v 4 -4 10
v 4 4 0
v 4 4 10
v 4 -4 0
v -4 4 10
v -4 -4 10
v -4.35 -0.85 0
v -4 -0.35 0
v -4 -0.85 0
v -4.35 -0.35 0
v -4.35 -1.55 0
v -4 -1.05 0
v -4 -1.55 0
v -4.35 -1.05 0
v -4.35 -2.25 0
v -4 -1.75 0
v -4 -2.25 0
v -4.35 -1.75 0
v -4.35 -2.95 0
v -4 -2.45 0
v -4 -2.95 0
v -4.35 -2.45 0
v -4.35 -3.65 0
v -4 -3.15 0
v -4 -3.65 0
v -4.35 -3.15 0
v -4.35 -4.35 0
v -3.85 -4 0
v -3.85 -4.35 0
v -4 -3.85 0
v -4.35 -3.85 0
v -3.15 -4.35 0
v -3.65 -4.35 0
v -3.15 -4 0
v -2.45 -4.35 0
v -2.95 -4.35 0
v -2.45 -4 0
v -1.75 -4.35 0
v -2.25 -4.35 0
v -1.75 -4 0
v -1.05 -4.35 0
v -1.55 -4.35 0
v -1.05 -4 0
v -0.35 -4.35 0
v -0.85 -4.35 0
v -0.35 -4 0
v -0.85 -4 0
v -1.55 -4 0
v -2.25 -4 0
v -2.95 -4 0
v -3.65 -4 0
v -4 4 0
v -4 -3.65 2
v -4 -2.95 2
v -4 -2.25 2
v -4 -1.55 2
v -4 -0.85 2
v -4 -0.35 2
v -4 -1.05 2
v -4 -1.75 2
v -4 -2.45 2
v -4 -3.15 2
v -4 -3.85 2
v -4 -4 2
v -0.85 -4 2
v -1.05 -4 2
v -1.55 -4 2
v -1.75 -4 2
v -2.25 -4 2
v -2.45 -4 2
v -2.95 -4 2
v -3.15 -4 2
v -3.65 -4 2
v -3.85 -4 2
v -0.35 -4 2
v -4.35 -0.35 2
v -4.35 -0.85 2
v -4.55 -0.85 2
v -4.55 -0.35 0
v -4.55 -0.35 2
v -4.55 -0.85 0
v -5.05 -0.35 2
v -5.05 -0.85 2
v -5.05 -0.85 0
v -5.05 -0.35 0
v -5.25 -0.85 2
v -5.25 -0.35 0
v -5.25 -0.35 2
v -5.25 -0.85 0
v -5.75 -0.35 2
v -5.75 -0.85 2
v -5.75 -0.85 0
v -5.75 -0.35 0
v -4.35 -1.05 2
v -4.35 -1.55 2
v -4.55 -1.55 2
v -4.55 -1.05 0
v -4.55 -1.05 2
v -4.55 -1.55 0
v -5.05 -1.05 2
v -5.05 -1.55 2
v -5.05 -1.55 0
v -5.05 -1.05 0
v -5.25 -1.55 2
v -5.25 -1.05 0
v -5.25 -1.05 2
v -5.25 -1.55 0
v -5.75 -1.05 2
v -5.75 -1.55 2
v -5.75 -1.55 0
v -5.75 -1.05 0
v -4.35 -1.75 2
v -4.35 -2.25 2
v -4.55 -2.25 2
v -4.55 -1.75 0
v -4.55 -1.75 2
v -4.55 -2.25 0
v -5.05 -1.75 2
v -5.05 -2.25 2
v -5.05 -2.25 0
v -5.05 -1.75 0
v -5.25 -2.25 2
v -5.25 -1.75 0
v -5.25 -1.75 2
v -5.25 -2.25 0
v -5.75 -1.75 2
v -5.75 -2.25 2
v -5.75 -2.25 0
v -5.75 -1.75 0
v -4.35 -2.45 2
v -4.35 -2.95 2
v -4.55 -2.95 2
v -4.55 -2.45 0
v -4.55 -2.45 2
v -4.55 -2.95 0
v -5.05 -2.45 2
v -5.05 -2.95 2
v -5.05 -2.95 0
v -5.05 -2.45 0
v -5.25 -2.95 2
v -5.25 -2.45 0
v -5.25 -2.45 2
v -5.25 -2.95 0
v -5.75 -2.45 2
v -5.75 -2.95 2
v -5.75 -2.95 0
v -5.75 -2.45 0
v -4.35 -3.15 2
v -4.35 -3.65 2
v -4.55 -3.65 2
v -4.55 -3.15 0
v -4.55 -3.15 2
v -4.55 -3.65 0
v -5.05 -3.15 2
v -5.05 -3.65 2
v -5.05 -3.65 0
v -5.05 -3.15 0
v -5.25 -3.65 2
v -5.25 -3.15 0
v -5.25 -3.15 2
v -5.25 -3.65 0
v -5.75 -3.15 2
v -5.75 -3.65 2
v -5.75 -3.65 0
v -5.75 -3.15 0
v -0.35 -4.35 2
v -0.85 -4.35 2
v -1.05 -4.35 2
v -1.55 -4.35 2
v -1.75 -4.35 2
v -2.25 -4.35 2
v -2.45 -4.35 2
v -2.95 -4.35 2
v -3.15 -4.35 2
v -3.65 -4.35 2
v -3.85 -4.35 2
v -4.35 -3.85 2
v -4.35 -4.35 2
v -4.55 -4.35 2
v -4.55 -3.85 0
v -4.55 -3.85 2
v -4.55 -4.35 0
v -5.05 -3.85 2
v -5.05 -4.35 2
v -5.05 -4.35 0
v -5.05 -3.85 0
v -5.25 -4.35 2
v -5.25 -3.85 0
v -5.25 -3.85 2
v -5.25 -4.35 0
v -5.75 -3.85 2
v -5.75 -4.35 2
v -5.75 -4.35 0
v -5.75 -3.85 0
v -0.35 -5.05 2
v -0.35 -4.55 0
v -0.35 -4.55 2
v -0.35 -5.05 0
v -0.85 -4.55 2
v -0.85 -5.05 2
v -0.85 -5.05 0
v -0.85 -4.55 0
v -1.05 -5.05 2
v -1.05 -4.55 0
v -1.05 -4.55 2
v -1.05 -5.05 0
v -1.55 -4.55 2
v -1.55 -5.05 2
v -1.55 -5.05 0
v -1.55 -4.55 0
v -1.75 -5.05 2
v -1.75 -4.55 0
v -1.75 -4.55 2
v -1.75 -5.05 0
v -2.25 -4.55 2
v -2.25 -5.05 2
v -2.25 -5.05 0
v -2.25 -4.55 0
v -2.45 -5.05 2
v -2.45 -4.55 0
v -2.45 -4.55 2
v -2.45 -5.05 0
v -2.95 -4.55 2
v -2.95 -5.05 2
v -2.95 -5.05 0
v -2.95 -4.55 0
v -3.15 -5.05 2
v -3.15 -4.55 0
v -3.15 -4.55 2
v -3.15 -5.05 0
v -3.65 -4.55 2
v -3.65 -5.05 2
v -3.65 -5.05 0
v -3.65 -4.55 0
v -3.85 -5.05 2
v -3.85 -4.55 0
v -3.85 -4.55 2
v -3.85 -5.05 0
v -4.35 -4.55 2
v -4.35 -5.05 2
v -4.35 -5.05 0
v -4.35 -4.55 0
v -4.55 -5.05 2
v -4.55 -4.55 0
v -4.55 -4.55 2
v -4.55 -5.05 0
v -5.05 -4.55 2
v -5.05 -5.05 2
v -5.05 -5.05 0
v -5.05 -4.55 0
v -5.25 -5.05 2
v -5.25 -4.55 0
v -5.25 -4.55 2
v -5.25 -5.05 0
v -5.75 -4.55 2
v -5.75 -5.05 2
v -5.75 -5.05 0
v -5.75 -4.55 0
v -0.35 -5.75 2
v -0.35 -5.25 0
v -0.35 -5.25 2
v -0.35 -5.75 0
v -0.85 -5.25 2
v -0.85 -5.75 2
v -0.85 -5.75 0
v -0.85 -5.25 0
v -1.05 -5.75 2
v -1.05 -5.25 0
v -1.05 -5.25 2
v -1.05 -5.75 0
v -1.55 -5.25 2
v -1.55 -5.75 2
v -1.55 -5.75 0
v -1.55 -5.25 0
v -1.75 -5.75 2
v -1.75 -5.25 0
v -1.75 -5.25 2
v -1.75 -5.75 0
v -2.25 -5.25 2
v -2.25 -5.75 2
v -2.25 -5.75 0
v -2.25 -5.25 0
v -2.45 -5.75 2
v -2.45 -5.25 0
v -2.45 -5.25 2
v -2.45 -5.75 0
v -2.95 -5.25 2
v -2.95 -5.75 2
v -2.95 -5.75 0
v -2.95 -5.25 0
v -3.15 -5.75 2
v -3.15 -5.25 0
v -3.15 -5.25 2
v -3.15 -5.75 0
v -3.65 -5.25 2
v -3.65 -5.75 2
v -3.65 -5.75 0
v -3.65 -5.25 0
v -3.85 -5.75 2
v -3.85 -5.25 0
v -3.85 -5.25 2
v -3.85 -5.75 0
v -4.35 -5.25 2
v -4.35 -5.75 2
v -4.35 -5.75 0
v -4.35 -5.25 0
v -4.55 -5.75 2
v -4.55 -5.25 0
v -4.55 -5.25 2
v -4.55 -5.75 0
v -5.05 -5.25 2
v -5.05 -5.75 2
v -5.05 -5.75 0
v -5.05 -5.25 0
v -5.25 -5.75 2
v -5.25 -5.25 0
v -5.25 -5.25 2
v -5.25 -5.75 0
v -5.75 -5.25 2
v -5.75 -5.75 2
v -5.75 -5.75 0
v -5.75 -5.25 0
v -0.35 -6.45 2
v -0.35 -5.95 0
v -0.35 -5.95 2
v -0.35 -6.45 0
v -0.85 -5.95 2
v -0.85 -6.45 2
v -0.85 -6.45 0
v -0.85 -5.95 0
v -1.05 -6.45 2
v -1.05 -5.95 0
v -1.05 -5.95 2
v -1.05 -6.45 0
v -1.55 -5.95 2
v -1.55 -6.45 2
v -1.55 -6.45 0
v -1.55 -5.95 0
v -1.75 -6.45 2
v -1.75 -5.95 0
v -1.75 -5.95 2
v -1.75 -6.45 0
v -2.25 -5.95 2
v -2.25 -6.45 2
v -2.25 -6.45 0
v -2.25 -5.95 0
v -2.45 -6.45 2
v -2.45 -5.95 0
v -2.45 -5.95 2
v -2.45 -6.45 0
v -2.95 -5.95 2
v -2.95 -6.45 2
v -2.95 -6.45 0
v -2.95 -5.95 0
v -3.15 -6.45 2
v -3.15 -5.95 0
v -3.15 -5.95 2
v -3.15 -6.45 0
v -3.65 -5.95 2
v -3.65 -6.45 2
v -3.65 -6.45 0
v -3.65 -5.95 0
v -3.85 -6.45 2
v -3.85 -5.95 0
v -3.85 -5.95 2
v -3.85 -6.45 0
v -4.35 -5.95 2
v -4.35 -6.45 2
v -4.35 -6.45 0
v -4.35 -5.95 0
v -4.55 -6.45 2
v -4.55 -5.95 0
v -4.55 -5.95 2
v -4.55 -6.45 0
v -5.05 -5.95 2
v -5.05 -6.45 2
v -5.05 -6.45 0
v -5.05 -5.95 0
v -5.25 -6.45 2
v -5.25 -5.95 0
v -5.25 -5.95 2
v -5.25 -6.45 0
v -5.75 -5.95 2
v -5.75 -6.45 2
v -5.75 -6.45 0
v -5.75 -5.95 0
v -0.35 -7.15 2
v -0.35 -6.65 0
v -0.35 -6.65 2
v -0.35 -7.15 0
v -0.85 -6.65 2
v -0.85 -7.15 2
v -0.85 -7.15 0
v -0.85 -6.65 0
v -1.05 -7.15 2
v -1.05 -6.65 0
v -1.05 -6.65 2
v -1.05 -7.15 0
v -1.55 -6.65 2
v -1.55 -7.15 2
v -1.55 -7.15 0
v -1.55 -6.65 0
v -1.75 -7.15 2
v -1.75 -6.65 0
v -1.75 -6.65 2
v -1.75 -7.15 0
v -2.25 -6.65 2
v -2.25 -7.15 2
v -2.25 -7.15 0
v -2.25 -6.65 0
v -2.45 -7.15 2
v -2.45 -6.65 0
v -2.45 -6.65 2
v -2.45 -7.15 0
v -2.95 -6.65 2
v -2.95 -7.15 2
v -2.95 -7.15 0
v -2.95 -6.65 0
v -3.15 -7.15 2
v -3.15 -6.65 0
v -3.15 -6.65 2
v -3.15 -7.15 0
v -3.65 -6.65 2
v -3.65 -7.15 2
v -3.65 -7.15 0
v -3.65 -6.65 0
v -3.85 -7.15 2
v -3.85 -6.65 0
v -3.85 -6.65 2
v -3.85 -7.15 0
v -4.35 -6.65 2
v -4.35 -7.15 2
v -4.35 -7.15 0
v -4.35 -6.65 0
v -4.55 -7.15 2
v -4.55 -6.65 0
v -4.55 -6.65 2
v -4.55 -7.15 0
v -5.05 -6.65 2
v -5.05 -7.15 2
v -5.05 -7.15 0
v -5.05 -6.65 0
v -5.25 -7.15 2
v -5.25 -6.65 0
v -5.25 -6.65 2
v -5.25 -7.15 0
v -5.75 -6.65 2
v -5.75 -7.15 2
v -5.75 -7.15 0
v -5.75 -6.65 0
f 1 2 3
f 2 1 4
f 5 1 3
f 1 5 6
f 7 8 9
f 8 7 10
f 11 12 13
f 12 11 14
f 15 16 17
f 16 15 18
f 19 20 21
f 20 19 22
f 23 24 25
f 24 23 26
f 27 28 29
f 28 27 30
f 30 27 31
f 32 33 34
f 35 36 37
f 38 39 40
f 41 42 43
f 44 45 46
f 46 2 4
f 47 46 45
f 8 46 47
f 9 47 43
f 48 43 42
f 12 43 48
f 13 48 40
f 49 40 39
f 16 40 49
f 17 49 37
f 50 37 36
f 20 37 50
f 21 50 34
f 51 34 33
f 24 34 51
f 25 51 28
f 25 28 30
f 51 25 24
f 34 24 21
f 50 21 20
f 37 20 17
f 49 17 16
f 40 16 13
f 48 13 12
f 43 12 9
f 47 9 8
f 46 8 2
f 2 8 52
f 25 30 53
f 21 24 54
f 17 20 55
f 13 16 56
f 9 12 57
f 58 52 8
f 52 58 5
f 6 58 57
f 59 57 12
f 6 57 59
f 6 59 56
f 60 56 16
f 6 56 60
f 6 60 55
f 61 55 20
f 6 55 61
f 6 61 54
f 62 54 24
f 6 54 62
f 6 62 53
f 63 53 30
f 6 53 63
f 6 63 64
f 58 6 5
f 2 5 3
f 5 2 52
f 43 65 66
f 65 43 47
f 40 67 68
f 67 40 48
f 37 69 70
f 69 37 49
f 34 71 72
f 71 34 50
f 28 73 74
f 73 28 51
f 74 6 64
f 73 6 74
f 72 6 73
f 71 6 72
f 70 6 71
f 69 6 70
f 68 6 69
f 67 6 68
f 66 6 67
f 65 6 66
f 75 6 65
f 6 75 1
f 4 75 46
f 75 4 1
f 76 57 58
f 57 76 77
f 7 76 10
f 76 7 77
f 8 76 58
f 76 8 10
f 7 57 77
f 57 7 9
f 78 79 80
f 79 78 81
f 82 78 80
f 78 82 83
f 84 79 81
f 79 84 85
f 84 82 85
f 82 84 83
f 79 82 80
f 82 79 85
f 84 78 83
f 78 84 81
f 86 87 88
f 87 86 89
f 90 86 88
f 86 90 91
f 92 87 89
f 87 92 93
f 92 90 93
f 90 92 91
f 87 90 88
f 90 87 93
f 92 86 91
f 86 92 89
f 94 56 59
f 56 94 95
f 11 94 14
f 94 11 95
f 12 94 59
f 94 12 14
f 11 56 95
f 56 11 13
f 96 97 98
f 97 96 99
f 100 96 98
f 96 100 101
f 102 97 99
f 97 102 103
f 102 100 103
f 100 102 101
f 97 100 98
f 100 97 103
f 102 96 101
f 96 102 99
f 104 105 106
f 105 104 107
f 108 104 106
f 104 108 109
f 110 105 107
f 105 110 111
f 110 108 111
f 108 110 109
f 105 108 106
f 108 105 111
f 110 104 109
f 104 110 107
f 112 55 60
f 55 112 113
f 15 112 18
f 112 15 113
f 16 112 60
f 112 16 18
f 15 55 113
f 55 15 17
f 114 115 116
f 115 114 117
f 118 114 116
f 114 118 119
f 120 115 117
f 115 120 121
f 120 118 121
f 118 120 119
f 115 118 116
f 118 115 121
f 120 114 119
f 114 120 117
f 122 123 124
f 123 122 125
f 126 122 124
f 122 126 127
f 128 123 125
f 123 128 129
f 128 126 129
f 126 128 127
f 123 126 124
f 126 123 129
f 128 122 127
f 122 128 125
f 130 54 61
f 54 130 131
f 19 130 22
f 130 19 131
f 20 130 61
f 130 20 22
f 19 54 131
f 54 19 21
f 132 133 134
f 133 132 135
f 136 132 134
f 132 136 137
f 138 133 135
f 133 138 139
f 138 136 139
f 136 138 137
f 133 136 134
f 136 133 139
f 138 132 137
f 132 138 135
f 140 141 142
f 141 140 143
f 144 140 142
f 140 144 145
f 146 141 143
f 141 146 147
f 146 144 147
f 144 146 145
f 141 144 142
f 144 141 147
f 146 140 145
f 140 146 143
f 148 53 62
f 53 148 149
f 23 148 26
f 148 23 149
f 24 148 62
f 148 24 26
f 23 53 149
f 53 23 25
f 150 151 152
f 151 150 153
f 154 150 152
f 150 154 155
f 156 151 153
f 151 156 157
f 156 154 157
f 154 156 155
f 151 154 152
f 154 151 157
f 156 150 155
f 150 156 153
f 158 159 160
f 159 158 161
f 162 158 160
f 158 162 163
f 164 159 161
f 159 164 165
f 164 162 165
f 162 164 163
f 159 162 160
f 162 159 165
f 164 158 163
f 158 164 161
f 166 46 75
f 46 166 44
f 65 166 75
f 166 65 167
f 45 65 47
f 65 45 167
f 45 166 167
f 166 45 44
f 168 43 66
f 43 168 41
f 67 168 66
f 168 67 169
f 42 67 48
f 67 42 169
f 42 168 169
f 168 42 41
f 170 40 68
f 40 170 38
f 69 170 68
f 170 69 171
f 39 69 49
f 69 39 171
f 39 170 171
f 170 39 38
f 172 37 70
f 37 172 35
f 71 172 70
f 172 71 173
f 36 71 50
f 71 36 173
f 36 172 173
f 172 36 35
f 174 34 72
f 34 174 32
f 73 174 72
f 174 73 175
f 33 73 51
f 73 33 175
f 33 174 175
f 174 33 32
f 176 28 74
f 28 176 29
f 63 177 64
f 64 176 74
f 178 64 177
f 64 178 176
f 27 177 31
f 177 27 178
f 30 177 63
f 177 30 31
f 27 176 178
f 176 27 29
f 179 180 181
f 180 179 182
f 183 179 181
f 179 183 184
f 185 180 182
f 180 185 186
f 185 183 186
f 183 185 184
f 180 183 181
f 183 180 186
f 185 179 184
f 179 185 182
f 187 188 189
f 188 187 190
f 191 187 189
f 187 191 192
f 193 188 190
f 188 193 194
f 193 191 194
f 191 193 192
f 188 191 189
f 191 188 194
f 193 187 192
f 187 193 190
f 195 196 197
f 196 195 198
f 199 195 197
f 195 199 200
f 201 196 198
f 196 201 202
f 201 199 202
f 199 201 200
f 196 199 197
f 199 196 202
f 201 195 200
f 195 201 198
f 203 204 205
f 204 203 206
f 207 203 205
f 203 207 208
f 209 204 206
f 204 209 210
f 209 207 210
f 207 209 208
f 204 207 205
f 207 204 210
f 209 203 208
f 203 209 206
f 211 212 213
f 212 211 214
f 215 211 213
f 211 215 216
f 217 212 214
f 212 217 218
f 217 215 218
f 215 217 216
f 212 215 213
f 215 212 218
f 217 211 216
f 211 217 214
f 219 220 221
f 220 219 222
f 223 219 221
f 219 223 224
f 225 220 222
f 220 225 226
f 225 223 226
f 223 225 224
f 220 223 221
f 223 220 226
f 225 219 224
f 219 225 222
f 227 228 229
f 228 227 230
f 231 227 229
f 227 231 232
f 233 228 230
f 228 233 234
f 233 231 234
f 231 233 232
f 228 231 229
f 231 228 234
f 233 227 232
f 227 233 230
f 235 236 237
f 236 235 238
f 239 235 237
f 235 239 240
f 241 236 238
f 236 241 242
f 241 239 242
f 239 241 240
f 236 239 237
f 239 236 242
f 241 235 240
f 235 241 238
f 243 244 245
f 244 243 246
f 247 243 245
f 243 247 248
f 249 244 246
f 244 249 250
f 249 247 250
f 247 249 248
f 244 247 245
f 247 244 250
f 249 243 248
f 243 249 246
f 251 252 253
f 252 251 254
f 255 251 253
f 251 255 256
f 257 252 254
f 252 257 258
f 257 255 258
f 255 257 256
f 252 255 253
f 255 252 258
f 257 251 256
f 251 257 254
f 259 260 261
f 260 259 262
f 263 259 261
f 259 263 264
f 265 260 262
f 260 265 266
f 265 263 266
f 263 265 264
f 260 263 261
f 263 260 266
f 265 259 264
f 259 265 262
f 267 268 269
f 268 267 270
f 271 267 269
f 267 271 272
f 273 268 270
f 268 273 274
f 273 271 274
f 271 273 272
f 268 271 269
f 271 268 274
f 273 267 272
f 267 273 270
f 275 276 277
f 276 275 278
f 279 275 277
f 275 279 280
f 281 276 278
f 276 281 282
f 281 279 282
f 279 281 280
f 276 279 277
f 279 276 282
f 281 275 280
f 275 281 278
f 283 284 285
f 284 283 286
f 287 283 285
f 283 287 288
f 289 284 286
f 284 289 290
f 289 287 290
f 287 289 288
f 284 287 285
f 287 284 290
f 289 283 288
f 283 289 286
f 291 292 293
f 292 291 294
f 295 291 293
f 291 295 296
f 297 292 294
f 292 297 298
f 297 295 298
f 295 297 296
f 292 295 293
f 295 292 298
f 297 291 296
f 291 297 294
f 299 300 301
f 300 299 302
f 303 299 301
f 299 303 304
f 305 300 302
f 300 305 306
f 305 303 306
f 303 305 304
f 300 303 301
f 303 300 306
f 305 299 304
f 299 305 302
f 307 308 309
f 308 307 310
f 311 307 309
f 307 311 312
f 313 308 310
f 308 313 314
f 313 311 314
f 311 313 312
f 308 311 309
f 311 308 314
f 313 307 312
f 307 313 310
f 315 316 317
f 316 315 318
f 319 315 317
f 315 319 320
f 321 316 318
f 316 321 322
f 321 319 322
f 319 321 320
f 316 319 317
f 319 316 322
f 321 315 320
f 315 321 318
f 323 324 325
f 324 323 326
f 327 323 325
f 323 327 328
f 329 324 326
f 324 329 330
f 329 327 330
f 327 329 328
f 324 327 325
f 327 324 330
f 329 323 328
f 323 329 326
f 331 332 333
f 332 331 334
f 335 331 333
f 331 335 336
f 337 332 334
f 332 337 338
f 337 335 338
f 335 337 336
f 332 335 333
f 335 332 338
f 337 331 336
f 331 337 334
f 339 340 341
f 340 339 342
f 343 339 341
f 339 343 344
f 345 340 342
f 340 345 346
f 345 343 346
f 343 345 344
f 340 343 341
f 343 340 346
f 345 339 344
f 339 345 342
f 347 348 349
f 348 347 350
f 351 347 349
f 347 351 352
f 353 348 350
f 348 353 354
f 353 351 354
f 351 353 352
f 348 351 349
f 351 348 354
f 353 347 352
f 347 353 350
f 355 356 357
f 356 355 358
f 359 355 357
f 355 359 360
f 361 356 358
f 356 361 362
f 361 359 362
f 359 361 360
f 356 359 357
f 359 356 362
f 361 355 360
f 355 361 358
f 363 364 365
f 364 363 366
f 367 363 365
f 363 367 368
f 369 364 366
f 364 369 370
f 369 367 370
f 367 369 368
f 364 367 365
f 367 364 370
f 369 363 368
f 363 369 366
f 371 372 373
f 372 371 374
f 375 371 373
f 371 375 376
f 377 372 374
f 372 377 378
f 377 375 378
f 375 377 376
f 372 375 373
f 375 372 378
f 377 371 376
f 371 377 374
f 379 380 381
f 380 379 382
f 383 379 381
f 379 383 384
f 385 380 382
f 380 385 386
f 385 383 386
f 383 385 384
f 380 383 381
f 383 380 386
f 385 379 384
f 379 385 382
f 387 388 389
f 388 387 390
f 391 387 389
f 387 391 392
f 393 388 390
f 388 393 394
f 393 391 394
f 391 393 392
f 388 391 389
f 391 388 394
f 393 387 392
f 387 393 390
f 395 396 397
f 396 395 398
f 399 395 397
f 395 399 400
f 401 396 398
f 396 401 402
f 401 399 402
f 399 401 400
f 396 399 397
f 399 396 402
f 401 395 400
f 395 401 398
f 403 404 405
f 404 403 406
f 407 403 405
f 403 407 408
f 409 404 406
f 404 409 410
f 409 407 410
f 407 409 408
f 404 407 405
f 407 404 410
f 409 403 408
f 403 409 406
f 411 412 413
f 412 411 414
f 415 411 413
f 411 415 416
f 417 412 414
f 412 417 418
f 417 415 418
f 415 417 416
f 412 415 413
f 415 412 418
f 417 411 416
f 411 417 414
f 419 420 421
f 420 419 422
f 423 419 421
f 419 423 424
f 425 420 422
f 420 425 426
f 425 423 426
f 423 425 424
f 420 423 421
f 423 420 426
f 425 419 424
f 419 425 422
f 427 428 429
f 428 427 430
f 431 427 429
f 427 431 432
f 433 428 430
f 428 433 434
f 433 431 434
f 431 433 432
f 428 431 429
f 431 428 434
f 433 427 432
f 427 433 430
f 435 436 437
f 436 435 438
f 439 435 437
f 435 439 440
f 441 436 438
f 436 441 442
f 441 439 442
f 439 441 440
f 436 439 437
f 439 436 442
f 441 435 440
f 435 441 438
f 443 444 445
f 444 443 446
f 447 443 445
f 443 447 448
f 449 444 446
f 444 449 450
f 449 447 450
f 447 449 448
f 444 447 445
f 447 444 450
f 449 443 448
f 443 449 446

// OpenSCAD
translate([0, 0, 5]) color([0,1,0,0.9]) cube([8, 8, 10], center=true);
translate([-0.6, -0.6, 1]) color([1,0,0]) cube([0.5, 0.5, 2], center=true);
translate([-1.3, -0.6, 1]) color([1,0,0]) cube([0.5, 0.5, 2], center=true);
translate([-2.0, -0.6, 1]) color([1,0,0]) cube([0.5, 0.5, 2], center=true);
translate([-2.7, -0.6, 1]) color([1,0,0]) cube([0.5, 0.5, 2], center=true);
translate([-3.4, -0.6, 1]) color([1,0,0]) cube([0.5, 0.5, 2], center=true);
translate([-4.1, -0.6, 1]) color([1,0,0]) cube([0.5, 0.5, 2], center=true);
translate([-4.8, -0.6, 1]) color([1,0,0]) cube([0.5, 0.5, 2], center=true);
translate([-5.5, -0.6, 1]) color([1,0,0]) cube([0.5, 0.5, 2], center=true);
translate([-0.6, -1.3, 1]) color([1,0,0]) cube([0.5, 0.5, 2], center=true);
translate([-1.3, -1.3, 1]) color([1,0,0]) cube([0.5, 0.5, 2], center=true);
translate([-2.0, -1.3, 1]) color([1,0,0]) cube([0.5, 0.5, 2], center=true);
translate([-2.7, -1.3, 1]) color([1,0,0]) cube([0.5, 0.5, 2], center=true);
translate([-3.4, -1.3, 1]) color([1,0,0]) cube([0.5, 0.5, 2], center=true);
translate([-4.1, -1.3, 1]) color([1,0,0]) cube([0.5, 0.5, 2], center=true);
translate([-4.8, -1.3, 1]) color([1,0,0]) cube([0.5, 0.5, 2], center=true);
translate([-5.5, -1.3, 1]) color([1,0,0]) cube([0.5, 0.5, 2], center=true);
translate([-0.6, -2.0, 1]) color([1,0,0]) cube([0.5, 0.5, 2], center=true);
translate([-1.3, -2.0, 1]) color([1,0,0]) cube([0.5, 0.5, 2], center=true);
translate([-2.0, -2.0, 1]) color([1,0,0]) cube([0.5, 0.5, 2], center=true);
translate([-2.7, -2.0, 1]) color([1,0,0]) cube([0.5, 0.5, 2], center=true);
translate([-3.4, -2.0, 1]) color([1,0,0]) cube([0.5, 0.5, 2], center=true);
translate([-4.1, -2.0, 1]) color([1,0,0]) cube([0.5, 0.5, 2], center=true);
translate([-4.8, -2.0, 1]) color([1,0,0]) cube([0.5, 0.5, 2], center=true);
translate([-5.5, -2.0, 1]) color([1,0,0]) cube([0.5, 0.5, 2], center=true);
translate([-0.6, -2.7, 1]) color([1,0,0]) cube([0.5, 0.5, 2], center=true);
translate([-1.3, -2.7, 1]) color([1,0,0]) cube([0.5, 0.5, 2], center=true);
translate([-2.0, -2.7, 1]) color([1,0,0]) cube([0.5, 0.5, 2], center=true);
translate([-2.7, -2.7, 1]) color([1,0,0]) cube([0.5, 0.5, 2], center=true);
translate([-3.4, -2.7, 1]) color([1,0,0]) cube([0.5, 0.5, 2], center=true);
translate([-4.1, -2.7, 1]) color([1,0,0]) cube([0.5, 0.5, 2], center=true);
translate([-4.8, -2.7, 1]) color([1,0,0]) cube([0.5, 0.5, 2], center=true);
translate([-5.5, -2.7, 1]) color([1,0,0]) cube([0.5, 0.5, 2], center=true);
translate([-0.6, -3.4, 1]) color([1,0,0]) cube([0.5, 0.5, 2], center=true);
translate([-1.3, -3.4, 1]) color([1,0,0]) cube([0.5, 0.5, 2], center=true);
translate([-2.0, -3.4, 1]) color([1,0,0]) cube([0.5, 0.5, 2], center=true);
translate([-2.7, -3.4, 1]) color([1,0,0]) cube([0.5, 0.5, 2], center=true);
translate([-3.4, -3.4, 1]) color([1,0,0]) cube([0.5, 0.5, 2], center=true);
translate([-4.1, -3.4, 1]) color([1,0,0]) cube([0.5, 0.5, 2], center=true);
translate([-4.8, -3.4, 1]) color([1,0,0]) cube([0.5, 0.5, 2], center=true);
translate([-5.5, -3.4, 1]) color([1,0,0]) cube([0.5, 0.5, 2], center=true);
translate([-0.6, -4.1, 1]) color([1,0,0]) cube([0.5, 0.5, 2], center=true);
translate([-1.3, -4.1, 1]) color([1,0,0]) cube([0.5, 0.5, 2], center=true);
translate([-2.0, -4.1, 1]) color([1,0,0]) cube([0.5, 0.5, 2], center=true);
translate([-2.7, -4.1, 1]) color([1,0,0]) cube([0.5, 0.5, 2], center=true);
translate([-3.4, -4.1, 1]) color([1,0,0]) cube([0.5, 0.5, 2], center=true);
translate([-4.1, -4.1, 1]) color([1,0,0]) cube([0.5, 0.5, 2], center=true);
translate([-4.8, -4.1, 1]) color([1,0,0]) cube([0.5, 0.5, 2], center=true);
translate([-5.5, -4.1, 1]) color([1,0,0]) cube([0.5, 0.5, 2], center=true);
translate([-0.6, -4.8, 1]) color([1,0,0]) cube([0.5, 0.5, 2], center=true);
translate([-1.3, -4.8, 1]) color([1,0,0]) cube([0.5, 0.5, 2], center=true);
translate([-2.0, -4.8, 1]) color([1,0,0]) cube([0.5, 0.5, 2], center=true);
translate([-2.7, -4.8, 1]) color([1,0,0]) cube([0.5, 0.5, 2], center=true);
translate([-3.4, -4.8, 1]) color([1,0,0]) cube([0.5, 0.5, 2], center=true);
translate([-4.1, -4.8, 1]) color([1,0,0]) cube([0.5, 0.5, 2], center=true);
translate([-4.8, -4.8, 1]) color([1,0,0]) cube([0.5, 0.5, 2], center=true);
translate([-5.5, -4.8, 1]) color([1,0,0]) cube([0.5, 0.5, 2], center=true);
translate([-0.6, -5.5, 1]) color([1,0,0]) cube([0.5, 0.5, 2], center=true);
translate([-1.3, -5.5, 1]) color([1,0,0]) cube([0.5, 0.5, 2], center=true);
translate([-2.0, -5.5, 1]) color([1,0,0]) cube([0.5, 0.5, 2], center=true);
translate([-2.7, -5.5, 1]) color([1,0,0]) cube([0.5, 0.5, 2], center=true);
translate([-3.4, -5.5, 1]) color([1,0,0]) cube([0.5, 0.5, 2], center=true);
translate([-4.1, -5.5, 1]) color([1,0,0]) cube([0.5, 0.5, 2], center=true);
translate([-4.8, -5.5, 1]) color([1,0,0]) cube([0.5, 0.5, 2], center=true);
translate([-5.5, -5.5, 1]) color([1,0,0]) cube([0.5, 0.5, 2], center=true);
translate([-0.6, -6.2, 1]) color([1,0,0]) cube([0.5, 0.5, 2], center=true);
translate([-1.3, -6.2, 1]) color([1,0,0]) cube([0.5, 0.5, 2], center=true);
translate([-2.0, -6.2, 1]) color([1,0,0]) cube([0.5, 0.5, 2], center=true);
translate([-2.7, -6.2, 1]) color([1,0,0]) cube([0.5, 0.5, 2], center=true);
translate([-3.4, -6.2, 1]) color([1,0,0]) cube([0.5, 0.5, 2], center=true);
translate([-4.1, -6.2, 1]) color([1,0,0]) cube([0.5, 0.5, 2], center=true);
translate([-4.8, -6.2, 1]) color([1,0,0]) cube([0.5, 0.5, 2], center=true);
translate([-5.5, -6.2, 1]) color([1,0,0]) cube([0.5, 0.5, 2], center=true);
translate([-0.6, -6.9, 1]) color([1,0,0]) cube([0.5, 0.5, 2], center=true);
translate([-1.3, -6.9, 1]) color([1,0,0]) cube([0.5, 0.5, 2], center=true);
translate([-2.0, -6.9, 1]) color([1,0,0]) cube([0.5, 0.5, 2], center=true);
translate([-2.7, -6.9, 1]) color([1,0,0]) cube([0.5, 0.5, 2], center=true);
translate([-3.4, -6.9, 1]) color([1,0,0]) cube([0.5, 0.5, 2], center=true);
translate([-4.1, -6.9, 1]) color([1,0,0]) cube([0.5, 0.5, 2], center=true);
translate([-4.8, -6.9, 1]) color([1,0,0]) cube([0.5, 0.5, 2], center=true);
translate([-5.5, -6.9, 1]) color([1,0,0]) cube([0.5, 0.5, 2], center=true);
